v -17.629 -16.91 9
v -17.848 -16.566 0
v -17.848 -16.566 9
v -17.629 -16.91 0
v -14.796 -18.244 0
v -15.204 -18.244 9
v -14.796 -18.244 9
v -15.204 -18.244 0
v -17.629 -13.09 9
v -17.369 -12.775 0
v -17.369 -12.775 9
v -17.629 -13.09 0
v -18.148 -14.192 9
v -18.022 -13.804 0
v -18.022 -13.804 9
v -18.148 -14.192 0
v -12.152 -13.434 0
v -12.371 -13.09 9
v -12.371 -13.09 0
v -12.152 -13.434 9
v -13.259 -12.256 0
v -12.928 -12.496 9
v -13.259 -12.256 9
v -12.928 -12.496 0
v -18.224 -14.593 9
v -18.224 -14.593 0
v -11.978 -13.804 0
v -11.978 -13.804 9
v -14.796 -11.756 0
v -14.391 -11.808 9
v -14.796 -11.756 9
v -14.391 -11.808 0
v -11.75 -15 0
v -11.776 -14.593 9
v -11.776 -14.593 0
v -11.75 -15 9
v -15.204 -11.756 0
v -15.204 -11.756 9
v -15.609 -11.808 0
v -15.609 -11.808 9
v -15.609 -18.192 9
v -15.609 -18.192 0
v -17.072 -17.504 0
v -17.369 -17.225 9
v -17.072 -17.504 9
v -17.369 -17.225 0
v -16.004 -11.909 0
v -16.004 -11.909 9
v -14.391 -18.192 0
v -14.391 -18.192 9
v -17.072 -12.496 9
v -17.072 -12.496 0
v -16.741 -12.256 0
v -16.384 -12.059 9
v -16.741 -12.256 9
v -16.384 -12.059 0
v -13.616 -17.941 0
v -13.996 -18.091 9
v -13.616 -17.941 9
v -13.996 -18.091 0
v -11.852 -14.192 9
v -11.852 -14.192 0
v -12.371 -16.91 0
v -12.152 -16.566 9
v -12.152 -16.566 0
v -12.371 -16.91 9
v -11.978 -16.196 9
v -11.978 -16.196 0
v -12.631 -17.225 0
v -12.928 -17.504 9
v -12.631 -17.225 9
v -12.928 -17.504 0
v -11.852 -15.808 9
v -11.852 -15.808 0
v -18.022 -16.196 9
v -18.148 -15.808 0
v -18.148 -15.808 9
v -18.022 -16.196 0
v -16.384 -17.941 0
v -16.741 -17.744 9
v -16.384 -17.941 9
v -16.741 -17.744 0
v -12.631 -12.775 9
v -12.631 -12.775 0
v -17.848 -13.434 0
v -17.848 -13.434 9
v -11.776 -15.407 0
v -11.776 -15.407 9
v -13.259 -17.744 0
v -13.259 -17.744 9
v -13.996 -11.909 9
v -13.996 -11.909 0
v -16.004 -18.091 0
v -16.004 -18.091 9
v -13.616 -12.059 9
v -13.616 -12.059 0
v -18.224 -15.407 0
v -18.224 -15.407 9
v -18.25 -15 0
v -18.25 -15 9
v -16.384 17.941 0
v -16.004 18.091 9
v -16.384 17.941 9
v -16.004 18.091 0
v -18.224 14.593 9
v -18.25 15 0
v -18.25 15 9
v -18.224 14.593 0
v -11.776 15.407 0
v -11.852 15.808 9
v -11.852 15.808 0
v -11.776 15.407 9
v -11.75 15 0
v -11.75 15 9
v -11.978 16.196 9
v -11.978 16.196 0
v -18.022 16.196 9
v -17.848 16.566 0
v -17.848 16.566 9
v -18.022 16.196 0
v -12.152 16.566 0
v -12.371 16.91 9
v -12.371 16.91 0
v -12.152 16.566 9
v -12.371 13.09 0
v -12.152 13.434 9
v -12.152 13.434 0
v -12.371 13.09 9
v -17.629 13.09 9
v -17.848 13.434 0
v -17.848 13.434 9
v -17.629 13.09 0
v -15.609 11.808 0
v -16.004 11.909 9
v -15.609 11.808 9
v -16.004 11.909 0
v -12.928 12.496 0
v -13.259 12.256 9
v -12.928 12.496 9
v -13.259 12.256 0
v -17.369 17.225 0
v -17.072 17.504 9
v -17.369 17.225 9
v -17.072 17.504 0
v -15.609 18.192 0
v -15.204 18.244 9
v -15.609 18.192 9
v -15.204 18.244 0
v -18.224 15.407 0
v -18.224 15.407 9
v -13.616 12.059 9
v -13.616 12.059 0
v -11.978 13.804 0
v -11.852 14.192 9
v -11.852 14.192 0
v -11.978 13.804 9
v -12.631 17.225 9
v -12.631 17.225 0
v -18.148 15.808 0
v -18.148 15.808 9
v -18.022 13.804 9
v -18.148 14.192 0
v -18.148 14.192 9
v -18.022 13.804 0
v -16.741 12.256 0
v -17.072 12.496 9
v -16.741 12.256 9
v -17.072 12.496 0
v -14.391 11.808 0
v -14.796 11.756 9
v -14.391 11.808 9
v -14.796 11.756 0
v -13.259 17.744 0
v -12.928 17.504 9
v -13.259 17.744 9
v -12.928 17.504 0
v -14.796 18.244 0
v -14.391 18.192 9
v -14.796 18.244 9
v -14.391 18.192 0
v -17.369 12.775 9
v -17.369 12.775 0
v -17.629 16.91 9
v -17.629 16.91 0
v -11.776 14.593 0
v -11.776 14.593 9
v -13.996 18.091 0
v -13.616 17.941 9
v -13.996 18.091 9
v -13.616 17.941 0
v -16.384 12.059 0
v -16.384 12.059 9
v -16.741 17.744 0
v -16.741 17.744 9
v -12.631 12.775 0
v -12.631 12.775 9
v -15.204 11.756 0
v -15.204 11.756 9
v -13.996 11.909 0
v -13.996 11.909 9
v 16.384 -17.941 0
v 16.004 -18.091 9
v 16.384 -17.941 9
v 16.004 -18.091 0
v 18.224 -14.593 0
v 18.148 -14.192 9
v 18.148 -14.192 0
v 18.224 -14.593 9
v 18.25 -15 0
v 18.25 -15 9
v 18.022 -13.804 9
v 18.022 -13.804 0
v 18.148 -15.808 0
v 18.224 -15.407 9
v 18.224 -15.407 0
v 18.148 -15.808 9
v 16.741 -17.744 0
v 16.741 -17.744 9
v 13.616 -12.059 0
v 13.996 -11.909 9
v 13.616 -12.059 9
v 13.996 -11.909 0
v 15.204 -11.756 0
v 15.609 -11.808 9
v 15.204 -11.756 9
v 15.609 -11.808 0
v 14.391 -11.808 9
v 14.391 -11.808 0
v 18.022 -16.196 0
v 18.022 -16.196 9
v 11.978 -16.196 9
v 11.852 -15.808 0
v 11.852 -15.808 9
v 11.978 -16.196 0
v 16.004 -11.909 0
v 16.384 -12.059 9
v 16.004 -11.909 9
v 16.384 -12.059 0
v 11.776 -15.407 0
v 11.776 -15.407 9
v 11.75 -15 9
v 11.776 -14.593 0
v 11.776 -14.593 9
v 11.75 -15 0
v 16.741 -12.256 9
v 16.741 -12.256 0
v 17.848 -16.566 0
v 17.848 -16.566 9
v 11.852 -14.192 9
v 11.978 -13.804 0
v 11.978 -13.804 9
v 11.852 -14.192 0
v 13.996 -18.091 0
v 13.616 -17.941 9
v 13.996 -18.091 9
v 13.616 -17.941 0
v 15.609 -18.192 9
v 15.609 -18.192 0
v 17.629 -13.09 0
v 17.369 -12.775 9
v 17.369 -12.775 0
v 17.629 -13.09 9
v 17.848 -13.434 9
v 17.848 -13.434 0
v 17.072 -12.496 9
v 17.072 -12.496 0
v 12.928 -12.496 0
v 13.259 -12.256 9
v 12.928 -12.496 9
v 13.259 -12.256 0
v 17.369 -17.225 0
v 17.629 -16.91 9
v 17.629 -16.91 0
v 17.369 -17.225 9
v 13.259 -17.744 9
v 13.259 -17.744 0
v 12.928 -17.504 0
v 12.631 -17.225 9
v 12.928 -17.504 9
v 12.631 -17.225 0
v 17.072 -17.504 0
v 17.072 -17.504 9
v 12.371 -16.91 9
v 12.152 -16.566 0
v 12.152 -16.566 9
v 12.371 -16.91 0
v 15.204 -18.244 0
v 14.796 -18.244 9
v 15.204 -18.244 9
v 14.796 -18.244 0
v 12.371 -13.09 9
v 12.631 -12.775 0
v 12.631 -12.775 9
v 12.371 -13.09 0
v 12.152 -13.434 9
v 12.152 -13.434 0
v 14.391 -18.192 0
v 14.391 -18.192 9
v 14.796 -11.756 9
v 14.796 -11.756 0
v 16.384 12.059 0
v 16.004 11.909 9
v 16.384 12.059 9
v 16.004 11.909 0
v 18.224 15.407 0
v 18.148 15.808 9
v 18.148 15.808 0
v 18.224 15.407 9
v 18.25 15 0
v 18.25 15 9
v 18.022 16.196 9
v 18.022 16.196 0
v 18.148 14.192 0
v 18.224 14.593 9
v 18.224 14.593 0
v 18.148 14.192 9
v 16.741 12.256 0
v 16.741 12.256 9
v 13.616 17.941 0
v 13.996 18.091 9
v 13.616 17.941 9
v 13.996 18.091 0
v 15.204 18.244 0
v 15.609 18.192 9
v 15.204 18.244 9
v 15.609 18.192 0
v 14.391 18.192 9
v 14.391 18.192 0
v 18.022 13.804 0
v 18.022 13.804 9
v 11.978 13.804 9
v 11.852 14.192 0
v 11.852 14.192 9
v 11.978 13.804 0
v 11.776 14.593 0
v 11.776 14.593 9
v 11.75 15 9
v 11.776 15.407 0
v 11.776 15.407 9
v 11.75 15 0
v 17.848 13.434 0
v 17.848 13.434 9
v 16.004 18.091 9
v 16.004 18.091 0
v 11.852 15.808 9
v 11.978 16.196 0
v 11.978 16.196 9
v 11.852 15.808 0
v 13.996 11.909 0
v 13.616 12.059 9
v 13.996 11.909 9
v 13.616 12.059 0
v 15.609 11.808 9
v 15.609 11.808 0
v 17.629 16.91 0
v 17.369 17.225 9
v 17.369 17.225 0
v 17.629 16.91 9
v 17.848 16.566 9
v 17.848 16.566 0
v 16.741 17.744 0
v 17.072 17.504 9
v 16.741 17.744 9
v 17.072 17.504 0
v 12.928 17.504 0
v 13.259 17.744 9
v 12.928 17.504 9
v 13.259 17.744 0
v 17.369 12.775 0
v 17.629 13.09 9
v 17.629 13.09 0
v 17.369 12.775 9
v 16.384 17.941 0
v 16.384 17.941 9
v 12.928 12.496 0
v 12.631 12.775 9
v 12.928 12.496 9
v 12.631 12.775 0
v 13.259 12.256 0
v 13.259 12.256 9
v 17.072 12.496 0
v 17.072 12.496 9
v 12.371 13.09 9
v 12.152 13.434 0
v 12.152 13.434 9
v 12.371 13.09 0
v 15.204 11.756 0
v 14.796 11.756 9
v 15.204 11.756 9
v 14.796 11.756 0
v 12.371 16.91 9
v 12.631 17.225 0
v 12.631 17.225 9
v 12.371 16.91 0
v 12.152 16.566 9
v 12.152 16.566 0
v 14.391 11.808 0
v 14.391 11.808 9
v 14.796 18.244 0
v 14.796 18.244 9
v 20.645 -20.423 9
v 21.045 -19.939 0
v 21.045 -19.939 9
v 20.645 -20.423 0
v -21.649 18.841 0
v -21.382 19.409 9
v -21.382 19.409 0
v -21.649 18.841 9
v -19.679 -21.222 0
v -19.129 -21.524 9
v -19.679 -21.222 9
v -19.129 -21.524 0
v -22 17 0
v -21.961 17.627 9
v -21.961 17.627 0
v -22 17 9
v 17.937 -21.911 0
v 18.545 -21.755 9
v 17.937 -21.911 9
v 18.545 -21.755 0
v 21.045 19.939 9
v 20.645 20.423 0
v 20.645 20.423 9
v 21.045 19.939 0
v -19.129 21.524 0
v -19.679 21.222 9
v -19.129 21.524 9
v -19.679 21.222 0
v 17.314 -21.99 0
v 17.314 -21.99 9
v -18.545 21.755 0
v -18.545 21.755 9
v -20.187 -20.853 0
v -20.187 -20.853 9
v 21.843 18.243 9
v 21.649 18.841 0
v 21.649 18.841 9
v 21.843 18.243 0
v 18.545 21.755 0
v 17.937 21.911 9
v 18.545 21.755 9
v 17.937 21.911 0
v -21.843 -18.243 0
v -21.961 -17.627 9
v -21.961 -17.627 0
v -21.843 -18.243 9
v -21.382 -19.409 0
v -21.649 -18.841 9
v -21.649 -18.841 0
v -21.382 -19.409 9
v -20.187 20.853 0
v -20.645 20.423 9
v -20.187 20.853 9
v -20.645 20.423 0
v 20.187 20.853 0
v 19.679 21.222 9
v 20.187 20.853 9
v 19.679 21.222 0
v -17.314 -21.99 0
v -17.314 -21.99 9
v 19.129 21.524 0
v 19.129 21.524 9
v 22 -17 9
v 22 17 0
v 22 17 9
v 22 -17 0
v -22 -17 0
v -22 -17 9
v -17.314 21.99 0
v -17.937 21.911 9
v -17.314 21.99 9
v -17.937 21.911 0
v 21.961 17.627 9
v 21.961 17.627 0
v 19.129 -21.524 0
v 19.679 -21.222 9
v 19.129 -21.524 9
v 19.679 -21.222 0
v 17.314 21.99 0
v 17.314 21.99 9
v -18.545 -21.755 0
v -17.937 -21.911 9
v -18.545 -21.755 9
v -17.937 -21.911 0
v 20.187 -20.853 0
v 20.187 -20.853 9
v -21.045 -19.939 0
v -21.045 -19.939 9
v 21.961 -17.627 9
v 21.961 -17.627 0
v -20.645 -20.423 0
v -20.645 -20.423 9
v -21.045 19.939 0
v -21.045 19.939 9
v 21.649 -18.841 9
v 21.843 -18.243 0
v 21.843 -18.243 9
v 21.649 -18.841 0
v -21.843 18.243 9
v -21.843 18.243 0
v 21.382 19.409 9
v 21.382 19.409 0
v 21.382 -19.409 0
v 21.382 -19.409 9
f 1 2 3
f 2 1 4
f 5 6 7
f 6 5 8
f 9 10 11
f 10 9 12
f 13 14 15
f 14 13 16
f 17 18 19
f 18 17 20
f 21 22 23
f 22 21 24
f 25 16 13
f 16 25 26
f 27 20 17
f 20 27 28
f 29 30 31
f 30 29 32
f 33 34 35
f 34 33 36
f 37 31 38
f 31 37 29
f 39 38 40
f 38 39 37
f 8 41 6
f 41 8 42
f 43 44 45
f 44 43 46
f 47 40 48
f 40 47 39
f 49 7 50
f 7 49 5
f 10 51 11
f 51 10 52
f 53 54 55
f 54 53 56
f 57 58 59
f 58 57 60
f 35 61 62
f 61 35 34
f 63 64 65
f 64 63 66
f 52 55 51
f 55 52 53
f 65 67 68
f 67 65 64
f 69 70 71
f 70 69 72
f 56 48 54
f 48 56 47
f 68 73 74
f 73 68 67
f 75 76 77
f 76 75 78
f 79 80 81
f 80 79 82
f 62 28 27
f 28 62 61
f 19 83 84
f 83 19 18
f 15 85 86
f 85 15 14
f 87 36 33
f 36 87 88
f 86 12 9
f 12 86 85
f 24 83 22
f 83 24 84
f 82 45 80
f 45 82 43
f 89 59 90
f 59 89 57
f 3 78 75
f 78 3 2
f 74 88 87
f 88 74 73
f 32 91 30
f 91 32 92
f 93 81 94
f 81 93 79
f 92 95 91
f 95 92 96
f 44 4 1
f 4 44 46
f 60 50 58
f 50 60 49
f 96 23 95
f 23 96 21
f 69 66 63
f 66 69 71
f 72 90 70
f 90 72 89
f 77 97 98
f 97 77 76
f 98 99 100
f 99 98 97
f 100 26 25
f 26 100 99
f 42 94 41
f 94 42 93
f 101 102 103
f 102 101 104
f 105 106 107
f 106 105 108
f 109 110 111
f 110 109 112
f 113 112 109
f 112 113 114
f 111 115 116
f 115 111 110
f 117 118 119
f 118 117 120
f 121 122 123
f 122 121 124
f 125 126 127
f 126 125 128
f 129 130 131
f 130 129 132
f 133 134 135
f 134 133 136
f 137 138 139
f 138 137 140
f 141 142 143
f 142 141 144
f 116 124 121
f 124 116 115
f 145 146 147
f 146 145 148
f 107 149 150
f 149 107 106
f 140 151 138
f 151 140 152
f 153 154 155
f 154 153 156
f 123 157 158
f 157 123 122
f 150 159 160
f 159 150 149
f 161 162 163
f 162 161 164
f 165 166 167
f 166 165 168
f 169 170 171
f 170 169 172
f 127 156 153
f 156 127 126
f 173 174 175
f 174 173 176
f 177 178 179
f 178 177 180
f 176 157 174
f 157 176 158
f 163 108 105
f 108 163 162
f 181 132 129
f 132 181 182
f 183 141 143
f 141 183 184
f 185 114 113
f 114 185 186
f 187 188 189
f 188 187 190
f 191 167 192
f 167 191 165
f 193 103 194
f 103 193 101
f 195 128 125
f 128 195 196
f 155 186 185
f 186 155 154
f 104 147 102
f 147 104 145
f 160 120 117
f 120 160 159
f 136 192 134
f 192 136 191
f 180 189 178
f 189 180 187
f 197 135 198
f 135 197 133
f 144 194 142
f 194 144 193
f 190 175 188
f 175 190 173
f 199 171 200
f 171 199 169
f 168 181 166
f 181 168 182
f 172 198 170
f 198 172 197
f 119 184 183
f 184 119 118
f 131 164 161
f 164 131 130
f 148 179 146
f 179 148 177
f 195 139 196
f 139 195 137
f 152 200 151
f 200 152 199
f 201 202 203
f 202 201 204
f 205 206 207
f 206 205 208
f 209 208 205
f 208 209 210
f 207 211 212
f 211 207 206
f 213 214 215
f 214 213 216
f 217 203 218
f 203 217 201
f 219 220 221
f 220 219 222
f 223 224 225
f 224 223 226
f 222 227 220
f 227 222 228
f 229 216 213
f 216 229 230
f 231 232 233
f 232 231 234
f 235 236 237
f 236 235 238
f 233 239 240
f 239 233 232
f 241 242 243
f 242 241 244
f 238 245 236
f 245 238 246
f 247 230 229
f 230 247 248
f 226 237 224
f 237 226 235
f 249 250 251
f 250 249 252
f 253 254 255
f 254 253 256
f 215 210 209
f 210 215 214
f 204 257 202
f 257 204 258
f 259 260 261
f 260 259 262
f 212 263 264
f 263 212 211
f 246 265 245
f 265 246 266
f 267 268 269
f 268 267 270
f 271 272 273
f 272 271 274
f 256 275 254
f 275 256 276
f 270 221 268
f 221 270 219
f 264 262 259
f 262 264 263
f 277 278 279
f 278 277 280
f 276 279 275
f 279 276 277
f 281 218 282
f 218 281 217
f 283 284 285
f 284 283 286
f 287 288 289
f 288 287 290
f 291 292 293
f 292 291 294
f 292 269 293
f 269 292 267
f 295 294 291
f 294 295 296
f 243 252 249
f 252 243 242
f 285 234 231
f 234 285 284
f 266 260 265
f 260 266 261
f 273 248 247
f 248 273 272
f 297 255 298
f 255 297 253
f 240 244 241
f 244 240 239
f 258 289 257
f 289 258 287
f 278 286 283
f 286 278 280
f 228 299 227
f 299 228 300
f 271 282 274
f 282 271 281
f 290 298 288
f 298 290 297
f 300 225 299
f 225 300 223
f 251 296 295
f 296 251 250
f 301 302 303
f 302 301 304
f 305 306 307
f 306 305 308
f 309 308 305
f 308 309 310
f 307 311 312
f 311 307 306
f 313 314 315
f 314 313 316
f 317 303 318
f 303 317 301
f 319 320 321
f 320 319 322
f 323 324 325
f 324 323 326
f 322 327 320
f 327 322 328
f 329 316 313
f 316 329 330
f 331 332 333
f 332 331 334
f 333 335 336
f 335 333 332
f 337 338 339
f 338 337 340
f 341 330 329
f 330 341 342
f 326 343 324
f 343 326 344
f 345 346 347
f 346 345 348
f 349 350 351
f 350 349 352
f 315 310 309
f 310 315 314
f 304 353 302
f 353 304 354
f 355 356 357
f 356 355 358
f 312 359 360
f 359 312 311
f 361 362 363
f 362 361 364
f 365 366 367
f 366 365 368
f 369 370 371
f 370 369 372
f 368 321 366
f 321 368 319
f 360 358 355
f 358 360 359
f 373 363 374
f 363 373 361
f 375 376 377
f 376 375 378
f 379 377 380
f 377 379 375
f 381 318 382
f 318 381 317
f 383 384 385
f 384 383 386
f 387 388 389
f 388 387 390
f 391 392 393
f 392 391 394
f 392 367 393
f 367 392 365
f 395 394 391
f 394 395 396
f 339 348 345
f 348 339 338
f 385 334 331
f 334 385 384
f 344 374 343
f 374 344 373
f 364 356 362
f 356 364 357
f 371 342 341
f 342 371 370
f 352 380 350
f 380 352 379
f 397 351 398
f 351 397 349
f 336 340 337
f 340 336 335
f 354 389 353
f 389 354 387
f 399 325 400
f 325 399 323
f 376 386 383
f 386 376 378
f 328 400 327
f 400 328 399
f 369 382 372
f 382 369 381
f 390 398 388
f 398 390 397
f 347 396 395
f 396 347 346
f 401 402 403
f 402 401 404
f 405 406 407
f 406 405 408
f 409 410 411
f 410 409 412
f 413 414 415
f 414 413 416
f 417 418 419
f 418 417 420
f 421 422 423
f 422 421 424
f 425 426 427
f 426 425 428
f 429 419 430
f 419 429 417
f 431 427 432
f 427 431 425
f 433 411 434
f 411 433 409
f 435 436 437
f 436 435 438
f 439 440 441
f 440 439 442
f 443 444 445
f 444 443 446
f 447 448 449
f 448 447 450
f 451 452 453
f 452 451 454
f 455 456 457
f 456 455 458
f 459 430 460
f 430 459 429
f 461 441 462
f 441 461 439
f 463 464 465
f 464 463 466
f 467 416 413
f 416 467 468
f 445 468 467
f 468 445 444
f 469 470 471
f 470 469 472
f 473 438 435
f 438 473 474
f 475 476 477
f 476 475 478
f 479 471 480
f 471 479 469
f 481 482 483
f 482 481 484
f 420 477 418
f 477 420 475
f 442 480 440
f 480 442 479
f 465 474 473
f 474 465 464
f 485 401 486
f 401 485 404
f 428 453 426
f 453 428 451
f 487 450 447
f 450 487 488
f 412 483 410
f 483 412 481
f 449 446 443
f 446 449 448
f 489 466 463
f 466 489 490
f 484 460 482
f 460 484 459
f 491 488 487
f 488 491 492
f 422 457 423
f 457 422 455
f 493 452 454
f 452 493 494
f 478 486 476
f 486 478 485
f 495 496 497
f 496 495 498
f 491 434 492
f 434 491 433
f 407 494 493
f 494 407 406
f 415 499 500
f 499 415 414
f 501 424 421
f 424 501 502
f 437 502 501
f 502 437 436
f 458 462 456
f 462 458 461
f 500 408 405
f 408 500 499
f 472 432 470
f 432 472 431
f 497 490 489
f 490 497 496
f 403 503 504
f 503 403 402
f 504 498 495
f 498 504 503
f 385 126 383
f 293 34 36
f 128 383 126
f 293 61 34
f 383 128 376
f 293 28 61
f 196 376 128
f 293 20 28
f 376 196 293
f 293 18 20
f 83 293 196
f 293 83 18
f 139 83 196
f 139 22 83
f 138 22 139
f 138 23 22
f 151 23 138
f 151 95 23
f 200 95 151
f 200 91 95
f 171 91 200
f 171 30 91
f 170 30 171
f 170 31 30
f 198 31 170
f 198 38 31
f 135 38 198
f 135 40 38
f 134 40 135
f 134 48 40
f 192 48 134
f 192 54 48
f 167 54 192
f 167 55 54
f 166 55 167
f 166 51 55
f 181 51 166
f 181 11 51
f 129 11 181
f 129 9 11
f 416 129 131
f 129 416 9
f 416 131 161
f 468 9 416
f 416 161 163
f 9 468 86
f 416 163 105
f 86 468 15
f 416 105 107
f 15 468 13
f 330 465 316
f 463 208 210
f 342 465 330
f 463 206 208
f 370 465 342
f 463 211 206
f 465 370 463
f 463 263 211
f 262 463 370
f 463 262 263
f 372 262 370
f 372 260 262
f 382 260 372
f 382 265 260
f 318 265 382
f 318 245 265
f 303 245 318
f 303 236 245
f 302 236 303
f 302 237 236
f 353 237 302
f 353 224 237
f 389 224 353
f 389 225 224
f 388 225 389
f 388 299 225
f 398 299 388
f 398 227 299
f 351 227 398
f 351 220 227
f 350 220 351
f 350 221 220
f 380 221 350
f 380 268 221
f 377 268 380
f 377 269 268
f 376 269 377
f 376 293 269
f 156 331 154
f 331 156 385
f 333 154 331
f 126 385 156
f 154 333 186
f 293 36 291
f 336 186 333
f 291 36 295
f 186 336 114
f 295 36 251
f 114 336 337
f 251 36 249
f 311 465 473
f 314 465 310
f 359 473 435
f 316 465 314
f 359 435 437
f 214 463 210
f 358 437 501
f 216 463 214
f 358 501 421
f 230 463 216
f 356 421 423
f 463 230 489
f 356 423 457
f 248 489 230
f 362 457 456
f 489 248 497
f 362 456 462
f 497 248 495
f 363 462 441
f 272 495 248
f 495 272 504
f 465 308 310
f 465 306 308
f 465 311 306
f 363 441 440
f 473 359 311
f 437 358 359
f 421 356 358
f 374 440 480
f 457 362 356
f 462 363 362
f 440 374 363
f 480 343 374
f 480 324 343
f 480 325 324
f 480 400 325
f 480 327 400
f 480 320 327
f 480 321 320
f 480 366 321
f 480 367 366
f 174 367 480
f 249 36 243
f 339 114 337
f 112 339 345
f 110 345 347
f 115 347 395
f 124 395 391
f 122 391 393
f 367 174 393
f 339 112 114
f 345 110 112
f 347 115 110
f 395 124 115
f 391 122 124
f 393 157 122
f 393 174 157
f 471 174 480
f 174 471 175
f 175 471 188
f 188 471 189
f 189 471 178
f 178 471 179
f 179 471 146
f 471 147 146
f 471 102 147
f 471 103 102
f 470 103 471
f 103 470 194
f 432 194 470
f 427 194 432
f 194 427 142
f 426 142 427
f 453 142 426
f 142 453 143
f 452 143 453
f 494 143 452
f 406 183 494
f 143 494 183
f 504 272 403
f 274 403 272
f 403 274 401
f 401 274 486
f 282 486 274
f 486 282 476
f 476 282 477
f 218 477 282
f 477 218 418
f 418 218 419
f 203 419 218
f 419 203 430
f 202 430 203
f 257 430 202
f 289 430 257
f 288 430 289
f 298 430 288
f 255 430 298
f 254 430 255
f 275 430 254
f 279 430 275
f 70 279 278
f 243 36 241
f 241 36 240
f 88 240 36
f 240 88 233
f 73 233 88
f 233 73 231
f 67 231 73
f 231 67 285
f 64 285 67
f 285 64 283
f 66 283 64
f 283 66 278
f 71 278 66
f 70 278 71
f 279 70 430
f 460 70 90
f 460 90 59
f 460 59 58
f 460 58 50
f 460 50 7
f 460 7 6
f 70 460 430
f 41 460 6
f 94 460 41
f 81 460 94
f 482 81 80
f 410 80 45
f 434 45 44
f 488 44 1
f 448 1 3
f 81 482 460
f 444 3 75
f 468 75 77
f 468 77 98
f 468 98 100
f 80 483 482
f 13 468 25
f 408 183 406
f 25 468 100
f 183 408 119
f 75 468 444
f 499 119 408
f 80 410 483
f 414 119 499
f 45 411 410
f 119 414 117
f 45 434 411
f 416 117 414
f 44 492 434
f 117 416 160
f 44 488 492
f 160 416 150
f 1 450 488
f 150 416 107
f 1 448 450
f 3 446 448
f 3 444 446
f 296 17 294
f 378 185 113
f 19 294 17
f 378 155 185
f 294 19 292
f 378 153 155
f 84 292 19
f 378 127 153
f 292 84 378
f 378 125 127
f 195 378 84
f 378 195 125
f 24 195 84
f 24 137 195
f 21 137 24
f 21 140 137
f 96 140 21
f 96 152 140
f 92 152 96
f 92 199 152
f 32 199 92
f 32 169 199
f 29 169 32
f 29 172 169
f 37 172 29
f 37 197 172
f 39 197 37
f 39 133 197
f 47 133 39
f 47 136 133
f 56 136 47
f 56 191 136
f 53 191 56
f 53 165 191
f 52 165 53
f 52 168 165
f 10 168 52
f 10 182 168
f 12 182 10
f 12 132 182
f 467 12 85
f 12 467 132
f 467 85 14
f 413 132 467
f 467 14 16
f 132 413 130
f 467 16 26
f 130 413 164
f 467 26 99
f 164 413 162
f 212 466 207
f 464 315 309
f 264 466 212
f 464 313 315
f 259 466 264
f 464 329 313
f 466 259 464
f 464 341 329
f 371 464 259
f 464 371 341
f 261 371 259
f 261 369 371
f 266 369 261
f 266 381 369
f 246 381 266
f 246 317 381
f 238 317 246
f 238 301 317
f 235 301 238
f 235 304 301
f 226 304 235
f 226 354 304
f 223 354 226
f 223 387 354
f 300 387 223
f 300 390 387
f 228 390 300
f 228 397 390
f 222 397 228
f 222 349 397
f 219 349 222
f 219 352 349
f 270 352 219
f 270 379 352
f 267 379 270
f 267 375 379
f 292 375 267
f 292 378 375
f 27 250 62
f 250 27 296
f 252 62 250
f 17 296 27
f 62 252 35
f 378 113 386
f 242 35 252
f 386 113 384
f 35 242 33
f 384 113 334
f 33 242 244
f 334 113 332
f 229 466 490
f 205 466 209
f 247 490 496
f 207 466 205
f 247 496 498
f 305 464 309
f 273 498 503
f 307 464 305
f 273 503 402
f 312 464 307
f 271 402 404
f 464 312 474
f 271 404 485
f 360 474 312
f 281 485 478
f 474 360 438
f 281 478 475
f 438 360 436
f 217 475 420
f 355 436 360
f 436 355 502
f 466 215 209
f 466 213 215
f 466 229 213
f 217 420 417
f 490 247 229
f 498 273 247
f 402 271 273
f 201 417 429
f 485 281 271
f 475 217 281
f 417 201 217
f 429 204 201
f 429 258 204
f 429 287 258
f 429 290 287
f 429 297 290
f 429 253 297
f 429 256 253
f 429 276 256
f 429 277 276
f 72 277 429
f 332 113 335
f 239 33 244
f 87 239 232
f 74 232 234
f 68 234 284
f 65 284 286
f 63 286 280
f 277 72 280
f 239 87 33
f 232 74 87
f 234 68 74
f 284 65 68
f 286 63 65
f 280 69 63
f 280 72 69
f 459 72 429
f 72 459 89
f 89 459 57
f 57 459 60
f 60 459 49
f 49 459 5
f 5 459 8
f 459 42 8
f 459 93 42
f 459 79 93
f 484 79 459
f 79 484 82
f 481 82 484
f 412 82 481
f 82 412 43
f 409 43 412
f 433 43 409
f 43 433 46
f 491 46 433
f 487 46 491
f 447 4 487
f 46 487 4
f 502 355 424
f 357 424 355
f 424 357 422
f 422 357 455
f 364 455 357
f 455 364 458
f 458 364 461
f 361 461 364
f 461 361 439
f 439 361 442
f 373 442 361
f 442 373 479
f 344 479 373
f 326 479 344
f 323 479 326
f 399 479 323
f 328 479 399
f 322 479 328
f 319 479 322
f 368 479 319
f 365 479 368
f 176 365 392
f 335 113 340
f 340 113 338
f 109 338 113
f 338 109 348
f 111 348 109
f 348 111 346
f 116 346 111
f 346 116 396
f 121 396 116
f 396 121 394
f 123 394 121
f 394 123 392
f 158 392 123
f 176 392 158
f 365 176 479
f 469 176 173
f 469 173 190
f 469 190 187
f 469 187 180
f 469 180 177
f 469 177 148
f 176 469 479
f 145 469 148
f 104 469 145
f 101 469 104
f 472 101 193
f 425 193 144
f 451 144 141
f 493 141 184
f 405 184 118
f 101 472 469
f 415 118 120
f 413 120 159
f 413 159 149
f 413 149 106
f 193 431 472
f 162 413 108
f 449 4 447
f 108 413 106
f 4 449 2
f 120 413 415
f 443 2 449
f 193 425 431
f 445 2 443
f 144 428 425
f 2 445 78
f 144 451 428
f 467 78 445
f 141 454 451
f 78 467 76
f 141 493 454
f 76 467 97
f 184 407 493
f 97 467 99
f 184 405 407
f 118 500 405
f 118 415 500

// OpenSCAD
$fn = 50;


difference() {
	union() {
		hull() {
			translate(v = [-17.0000000000, 17.0000000000, 0]) {
				cylinder(h = 9, r = 5);
			}
			translate(v = [17.0000000000, 17.0000000000, 0]) {
				cylinder(h = 9, r = 5);
			}
			translate(v = [-17.0000000000, -17.0000000000, 0]) {
				cylinder(h = 9, r = 5);
			}
			translate(v = [17.0000000000, -17.0000000000, 0]) {
				cylinder(h = 9, r = 5);
			}
		}
	}
	union() {
		translate(v = [-15.0000000000, -15.0000000000, -100.0000000000]) {
			cylinder(h = 200, r = 3.2500000000);
		}
		translate(v = [-15.0000000000, 15.0000000000, -100.0000000000]) {
			cylinder(h = 200, r = 3.2500000000);
		}
		translate(v = [15.0000000000, -15.0000000000, -100.0000000000]) {
			cylinder(h = 200, r = 3.2500000000);
		}
		translate(v = [15.0000000000, 15.0000000000, -100.0000000000]) {
			cylinder(h = 200, r = 3.2500000000);
		}
	}
}
